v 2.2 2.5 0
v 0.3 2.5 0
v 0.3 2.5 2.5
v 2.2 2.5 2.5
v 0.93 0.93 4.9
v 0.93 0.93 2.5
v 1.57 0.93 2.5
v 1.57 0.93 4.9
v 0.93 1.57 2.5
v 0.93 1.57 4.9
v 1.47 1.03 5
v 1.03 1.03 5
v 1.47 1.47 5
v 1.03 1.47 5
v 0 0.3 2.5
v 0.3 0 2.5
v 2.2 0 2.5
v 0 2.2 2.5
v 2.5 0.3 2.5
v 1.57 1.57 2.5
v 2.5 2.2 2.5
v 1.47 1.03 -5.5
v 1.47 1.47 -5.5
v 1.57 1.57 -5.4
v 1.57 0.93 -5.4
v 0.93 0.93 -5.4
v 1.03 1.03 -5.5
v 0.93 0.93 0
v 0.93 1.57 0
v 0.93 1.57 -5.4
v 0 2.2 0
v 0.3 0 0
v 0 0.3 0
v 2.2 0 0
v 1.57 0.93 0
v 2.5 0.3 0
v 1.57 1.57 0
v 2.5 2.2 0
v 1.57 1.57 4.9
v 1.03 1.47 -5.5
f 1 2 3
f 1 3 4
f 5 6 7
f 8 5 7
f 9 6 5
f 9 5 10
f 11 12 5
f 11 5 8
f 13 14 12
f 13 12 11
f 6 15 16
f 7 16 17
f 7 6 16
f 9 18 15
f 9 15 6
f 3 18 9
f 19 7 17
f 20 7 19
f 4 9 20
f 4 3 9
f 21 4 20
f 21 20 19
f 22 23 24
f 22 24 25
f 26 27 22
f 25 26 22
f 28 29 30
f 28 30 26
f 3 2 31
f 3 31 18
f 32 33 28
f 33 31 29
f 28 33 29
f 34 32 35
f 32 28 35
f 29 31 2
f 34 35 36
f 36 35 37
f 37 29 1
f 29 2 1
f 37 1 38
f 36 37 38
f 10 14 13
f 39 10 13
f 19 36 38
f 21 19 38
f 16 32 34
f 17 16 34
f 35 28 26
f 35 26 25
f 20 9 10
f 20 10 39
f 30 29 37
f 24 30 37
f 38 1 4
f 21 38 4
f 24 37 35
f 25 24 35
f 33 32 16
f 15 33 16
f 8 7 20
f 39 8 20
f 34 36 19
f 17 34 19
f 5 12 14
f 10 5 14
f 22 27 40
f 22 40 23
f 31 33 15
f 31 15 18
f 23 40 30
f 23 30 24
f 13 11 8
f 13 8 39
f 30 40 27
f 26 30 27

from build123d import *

# Parameters (mm, degrees)
SKETCH_W        = 2.5
SKETCH_H        = 2.5
PAD_DEPTH       = 2.5
CHAMFER_SIZE    = 0.3
SKETCH001_W     = 0.64
SKETCH001_H     = 0.64
PAD001_DEPTH    = 2.5
CHAMFER001_SIZE = 0.1
SKETCH002_W     = 0.64
SKETCH002_H     = 0.64
PAD002_DEPTH    = 5.5
CHAMFER002_SIZE = 0.1


with BuildPart() as part:
    # Sketch → Pad (new body)
    with BuildSketch(Plane.XY):
        with Locations((1.25, 1.25)):
            Rectangle(SKETCH_W, SKETCH_H)
    extrude(amount=PAD_DEPTH)

    # Chamfer
    chamfer_edges = [part.edges().sort_by_distance(p)[0] for p in [
        (0, 0, 1.25),
        (2.5, 0, 1.25),
        (0, 2.5, 1.25),
        (2.5, 2.5, 1.25),
    ]]
    chamfer(chamfer_edges, length=CHAMFER_SIZE)

    # Sketch001 → Pad001 (new body)
    with BuildSketch(Plane.XY.offset(2.5)):
        with Locations((1.25, 1.25)):
            Rectangle(SKETCH001_W, SKETCH001_H)
    extrude(amount=PAD001_DEPTH)

    # Chamfer001
    chamfer001_edges = [part.edges().sort_by_distance(p)[0] for p in [
        (1.25, 1.57, 5),
        (1.57, 1.25, 5),
        (1.25, 0.93, 5),
        (0.93, 1.25, 5),
    ]]
    chamfer(chamfer001_edges, length=CHAMFER001_SIZE)

    # Sketch002 → Pad002 (new body)
    with BuildSketch(Plane(origin=(0, 0, 0), x_dir=(1, 0, 0), z_dir=(0, 0, -1))):
        with Locations((1.25, -1.25)):
            Rectangle(SKETCH002_W, SKETCH002_H)
    extrude(amount=PAD002_DEPTH)

    # Chamfer002
    chamfer002_edges = [part.edges().sort_by_distance(p)[0] for p in [
        (1.25, 0.93, -5.5),
        (1.57, 1.25, -5.5),
        (1.25, 1.57, -5.5),
        (0.93, 1.25, -5.5),
    ]]
    chamfer(chamfer002_edges, length=CHAMFER002_SIZE)


solid = part.part
